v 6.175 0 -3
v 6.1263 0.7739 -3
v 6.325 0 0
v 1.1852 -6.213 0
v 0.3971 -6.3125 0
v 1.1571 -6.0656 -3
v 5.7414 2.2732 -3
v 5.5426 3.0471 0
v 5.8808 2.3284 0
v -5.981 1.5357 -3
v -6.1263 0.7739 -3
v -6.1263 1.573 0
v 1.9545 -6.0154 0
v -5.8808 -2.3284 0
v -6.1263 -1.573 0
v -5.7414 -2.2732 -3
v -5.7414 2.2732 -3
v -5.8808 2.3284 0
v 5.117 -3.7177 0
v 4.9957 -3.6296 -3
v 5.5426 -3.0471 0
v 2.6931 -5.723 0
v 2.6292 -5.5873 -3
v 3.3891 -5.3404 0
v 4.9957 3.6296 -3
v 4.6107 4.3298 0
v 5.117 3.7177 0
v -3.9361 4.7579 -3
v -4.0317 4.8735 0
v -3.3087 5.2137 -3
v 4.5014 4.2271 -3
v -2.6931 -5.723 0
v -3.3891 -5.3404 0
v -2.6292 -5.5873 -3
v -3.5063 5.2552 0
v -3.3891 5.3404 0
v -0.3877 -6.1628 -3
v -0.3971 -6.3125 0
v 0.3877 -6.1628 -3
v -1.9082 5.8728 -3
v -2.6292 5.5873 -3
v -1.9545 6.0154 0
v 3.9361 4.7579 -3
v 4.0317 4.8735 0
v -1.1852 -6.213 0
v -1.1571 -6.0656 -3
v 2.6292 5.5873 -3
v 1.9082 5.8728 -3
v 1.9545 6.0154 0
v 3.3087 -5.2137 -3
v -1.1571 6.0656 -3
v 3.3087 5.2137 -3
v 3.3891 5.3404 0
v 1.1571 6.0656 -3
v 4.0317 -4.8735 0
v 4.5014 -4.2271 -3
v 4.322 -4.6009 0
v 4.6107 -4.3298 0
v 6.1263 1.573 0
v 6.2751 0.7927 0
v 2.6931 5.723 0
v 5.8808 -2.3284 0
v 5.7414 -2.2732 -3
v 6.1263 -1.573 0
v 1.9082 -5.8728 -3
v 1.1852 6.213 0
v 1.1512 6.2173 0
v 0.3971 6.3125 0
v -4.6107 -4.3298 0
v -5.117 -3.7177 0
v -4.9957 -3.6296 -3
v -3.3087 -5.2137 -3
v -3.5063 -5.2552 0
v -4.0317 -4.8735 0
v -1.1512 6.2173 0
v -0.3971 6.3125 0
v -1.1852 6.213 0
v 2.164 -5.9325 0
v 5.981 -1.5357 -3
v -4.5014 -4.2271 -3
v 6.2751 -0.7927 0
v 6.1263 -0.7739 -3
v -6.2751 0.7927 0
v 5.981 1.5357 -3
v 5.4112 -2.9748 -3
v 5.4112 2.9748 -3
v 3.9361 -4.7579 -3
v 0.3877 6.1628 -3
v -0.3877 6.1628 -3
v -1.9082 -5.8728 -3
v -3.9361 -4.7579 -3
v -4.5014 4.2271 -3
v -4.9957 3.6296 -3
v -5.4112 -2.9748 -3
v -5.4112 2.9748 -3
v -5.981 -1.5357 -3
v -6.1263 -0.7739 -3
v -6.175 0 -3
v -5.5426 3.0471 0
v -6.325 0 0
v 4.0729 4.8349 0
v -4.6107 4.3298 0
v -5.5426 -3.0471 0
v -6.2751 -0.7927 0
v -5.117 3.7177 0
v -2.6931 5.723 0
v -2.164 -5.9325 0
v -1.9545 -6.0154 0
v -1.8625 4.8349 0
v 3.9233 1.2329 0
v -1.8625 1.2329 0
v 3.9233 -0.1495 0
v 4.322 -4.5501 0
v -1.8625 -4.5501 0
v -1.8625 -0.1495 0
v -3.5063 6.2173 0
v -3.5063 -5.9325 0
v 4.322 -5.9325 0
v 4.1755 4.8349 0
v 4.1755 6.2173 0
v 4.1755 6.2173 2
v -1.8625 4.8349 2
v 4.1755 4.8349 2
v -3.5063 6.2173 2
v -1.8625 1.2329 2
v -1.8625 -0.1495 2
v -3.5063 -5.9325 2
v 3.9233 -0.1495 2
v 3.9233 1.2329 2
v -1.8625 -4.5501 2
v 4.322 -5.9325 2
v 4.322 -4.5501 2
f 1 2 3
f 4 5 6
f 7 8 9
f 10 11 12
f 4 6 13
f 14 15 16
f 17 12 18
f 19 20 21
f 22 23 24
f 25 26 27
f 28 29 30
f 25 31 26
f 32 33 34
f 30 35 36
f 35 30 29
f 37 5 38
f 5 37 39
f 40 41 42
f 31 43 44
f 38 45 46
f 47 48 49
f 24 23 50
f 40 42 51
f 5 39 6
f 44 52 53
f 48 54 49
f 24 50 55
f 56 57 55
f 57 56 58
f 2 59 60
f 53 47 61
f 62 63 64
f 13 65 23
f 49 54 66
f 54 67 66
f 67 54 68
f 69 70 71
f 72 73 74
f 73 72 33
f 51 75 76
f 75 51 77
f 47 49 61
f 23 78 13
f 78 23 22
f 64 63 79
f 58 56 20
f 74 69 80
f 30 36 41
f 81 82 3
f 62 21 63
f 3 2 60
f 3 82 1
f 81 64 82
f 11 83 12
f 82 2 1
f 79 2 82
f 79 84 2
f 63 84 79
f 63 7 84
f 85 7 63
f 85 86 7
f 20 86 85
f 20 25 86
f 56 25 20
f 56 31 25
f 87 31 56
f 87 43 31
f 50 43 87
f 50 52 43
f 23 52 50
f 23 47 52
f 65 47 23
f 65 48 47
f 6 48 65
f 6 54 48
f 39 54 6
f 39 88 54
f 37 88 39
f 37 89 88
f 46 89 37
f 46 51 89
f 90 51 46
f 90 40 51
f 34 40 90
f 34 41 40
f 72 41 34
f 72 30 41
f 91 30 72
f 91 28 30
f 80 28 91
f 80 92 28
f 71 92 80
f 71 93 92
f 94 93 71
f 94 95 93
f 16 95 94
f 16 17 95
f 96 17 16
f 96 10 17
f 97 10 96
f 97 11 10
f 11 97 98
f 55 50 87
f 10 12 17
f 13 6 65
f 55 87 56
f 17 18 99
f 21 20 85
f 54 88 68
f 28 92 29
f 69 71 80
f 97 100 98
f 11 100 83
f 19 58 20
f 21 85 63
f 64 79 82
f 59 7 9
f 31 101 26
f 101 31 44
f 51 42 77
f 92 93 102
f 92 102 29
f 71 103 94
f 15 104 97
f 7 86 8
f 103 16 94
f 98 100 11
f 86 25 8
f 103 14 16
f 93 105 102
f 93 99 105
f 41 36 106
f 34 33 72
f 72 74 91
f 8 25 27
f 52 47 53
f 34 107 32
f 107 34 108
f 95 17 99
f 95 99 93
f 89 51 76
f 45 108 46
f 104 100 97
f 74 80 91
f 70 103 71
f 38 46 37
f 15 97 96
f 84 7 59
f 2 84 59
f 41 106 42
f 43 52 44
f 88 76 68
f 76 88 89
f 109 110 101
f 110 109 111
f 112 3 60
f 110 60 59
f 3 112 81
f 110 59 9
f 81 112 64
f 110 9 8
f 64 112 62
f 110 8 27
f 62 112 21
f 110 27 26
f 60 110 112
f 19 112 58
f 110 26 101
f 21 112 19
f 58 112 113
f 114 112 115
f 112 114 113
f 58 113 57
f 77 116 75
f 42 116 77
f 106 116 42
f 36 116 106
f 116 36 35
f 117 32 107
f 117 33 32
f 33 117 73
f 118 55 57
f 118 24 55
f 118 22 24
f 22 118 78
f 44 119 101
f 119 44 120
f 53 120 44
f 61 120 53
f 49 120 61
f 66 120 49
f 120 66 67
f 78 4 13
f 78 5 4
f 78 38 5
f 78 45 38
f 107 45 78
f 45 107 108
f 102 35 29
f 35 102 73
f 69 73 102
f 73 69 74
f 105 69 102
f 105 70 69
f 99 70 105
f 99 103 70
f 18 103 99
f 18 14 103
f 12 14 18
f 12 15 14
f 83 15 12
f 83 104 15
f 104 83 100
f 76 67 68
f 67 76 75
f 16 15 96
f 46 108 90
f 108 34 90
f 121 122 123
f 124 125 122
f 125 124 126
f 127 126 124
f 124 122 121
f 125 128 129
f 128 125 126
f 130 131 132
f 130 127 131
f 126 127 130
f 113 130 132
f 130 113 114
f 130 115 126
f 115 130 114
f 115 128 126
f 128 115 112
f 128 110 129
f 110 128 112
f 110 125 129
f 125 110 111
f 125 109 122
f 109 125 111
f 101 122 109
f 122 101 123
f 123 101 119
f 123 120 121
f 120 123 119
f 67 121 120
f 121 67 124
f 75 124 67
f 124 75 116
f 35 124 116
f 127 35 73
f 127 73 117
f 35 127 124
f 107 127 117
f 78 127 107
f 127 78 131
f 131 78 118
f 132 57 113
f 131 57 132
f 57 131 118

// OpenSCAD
$fn = 50;


difference() {
	union() {
		translate(v = [0, 0, -3.0000000000]) {
			cylinder(h = 3, r1 = 6.1750000000, r2 = 6.3250000000);
		}
		linear_extrude(height = 2) {
			text(font = "Impact", halign = "center", size = 12, text = "E", valign = "center");
		}
	}
	union();
}
